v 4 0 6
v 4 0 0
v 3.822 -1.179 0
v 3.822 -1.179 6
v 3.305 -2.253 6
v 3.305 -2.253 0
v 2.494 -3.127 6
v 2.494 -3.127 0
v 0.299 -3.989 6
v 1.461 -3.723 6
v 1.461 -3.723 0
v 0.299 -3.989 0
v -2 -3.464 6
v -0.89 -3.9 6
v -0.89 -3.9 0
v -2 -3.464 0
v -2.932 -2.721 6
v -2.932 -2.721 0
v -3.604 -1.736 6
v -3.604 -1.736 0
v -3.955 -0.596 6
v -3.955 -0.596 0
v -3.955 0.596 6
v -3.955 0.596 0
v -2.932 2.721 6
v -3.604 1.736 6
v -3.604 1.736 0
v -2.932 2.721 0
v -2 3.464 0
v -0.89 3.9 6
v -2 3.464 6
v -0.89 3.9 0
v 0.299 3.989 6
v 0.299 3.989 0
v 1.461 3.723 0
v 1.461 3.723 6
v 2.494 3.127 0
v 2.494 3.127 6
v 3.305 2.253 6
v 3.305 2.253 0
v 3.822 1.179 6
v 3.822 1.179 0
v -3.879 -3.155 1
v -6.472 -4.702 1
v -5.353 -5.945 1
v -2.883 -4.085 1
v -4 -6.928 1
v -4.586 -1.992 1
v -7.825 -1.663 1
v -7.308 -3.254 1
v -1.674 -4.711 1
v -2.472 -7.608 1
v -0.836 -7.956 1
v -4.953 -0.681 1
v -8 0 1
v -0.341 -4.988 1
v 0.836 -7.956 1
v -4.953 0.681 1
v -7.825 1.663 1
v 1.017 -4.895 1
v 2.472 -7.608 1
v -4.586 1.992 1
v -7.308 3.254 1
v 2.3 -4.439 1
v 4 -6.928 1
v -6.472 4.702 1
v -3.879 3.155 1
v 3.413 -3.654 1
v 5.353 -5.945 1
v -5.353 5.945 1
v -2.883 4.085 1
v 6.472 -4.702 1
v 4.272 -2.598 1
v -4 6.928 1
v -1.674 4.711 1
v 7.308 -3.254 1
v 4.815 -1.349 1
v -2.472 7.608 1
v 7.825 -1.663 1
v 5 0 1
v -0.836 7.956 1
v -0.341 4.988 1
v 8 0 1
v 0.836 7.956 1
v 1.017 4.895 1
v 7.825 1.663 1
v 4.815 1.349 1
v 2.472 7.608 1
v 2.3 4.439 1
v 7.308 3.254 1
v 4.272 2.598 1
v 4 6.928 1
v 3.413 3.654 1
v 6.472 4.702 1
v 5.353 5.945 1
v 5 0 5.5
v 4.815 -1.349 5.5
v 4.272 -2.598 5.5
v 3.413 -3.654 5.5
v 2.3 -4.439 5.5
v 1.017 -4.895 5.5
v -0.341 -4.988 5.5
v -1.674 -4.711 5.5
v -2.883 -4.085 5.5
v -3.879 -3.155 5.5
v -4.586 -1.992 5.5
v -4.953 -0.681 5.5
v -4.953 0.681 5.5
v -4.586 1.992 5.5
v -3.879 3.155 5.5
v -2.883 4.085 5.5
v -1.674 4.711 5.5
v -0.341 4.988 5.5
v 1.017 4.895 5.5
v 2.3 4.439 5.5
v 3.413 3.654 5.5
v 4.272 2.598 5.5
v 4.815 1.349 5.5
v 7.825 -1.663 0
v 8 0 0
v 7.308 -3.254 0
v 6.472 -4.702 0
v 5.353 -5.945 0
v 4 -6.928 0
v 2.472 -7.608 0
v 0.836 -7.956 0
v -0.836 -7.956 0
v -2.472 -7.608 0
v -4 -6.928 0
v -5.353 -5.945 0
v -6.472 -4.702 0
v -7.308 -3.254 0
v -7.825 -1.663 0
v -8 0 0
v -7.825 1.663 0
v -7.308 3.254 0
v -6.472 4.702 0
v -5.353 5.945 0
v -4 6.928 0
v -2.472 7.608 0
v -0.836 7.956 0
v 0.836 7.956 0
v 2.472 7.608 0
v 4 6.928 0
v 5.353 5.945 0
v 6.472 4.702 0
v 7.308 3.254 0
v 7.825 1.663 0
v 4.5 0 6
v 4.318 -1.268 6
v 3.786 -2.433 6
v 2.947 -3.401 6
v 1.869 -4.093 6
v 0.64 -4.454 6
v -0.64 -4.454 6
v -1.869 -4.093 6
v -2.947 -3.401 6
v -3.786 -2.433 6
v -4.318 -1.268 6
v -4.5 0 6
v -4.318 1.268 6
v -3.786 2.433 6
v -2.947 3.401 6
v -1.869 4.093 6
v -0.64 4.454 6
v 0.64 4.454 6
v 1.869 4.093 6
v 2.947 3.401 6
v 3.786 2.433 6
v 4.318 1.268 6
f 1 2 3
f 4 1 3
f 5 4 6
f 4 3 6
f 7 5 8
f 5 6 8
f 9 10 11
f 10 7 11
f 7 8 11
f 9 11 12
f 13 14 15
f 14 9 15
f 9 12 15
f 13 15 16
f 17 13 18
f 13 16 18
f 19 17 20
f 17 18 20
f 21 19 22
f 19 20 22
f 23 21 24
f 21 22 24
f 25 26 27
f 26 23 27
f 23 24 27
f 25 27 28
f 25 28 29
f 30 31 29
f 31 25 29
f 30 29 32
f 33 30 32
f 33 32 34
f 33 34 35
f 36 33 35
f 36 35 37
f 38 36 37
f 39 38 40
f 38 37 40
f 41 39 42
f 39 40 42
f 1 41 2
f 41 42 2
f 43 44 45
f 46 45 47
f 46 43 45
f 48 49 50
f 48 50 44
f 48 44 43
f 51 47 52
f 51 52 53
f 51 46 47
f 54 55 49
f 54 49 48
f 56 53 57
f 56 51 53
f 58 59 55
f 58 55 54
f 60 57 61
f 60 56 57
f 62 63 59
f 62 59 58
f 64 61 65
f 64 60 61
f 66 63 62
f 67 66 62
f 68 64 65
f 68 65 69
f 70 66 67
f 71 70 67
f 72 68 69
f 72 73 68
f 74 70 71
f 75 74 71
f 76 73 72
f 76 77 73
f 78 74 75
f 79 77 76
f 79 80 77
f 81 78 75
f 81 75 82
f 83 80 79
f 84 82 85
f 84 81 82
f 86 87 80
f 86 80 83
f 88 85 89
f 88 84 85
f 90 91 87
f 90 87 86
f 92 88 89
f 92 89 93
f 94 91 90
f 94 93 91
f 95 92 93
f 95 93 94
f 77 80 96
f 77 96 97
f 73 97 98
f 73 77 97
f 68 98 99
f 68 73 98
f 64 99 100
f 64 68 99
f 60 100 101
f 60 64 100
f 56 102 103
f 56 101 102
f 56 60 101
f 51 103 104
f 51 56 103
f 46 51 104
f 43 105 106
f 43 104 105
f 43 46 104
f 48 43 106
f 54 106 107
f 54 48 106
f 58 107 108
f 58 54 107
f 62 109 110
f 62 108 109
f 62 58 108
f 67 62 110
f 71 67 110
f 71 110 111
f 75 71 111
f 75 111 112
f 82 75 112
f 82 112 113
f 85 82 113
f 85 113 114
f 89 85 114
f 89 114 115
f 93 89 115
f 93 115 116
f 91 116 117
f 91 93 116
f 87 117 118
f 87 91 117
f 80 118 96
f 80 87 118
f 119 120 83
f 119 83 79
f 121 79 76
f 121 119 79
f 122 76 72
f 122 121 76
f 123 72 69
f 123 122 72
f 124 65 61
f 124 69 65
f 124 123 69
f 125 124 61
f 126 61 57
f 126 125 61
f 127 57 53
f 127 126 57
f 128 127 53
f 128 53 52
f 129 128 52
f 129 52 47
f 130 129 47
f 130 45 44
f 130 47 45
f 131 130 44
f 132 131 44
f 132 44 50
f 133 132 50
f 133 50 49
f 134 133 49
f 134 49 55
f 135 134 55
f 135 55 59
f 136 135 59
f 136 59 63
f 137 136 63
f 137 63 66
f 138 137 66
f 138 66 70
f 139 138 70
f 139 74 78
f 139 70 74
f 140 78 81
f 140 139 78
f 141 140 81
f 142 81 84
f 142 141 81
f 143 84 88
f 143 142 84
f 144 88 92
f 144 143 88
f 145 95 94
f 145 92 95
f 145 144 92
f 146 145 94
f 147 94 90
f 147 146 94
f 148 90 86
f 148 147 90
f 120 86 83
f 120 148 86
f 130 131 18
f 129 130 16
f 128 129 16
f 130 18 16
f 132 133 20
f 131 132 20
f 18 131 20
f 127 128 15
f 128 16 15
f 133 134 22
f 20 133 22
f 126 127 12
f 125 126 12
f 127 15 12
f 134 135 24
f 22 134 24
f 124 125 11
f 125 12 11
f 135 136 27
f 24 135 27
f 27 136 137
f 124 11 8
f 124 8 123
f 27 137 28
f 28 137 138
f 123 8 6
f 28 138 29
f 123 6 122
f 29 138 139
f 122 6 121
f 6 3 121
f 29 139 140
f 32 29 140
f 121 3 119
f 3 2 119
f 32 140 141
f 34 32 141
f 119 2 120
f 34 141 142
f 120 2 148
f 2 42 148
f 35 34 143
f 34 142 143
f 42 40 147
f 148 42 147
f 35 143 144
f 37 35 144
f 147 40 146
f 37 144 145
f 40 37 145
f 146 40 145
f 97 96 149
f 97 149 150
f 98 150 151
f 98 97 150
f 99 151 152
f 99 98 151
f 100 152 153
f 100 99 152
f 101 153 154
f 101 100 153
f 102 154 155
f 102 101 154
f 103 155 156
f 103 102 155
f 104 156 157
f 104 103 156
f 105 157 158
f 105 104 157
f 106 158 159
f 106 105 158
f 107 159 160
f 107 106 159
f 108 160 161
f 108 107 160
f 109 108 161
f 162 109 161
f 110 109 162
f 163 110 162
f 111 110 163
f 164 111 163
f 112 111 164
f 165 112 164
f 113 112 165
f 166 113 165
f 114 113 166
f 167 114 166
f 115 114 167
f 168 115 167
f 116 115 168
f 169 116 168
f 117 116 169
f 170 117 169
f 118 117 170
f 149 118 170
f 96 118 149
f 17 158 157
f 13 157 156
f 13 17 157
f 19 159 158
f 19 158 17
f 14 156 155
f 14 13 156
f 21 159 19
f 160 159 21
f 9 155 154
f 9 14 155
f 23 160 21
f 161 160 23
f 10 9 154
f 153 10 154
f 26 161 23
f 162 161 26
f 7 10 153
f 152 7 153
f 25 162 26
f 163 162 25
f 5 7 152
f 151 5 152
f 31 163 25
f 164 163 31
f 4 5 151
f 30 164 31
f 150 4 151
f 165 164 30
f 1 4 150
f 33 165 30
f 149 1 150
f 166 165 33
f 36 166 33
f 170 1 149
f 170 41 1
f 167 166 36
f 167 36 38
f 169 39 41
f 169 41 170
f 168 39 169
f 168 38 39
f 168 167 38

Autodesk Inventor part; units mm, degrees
ref_plane "YZ Plane" through (0, 0, 0) normal (1, 0, 0) x (0, 1, 0)
ref_plane "XZ Plane" through (0, 0, 0) normal (0, 1, 0) x (-1, 0, 0)
ref_plane "XY Plane" through (0, 0, 0) normal (0, 0, 1) x (1, 0, 0)
sketch "スケッチ1" plane through (0, 0, 0) normal (0, 0, 1) x (1, 0, 0)
  circle A0 centre (0, 0) radius 4
  circle A1 centre (0, 0) radius 8
  dimension "d0" = 8
  dimension "d1" = 16
extrude "押し出し1" add sketch "スケッチ1" along normal blind 1
sketch "スケッチ2" plane through (0, 0, 1) normal (0, 0, 1) x (1, 0, 0)
  circle A0 centre (0, 0) radius 5
  circle A1 centre (0, 0) radius 8 projected
  circle A2 centre (0, 0) radius 4 projected
  dimension "d4" = 10
extrude "押し出し2" add sketch "スケッチ2" along normal blind 5 contours A0
chamfer "面取り1" distance 0.5 angle 45 1 edges at (-5, 0, 6)
properties part number "オイレスw3f10-8a" material "アセタール樹脂、黒"
